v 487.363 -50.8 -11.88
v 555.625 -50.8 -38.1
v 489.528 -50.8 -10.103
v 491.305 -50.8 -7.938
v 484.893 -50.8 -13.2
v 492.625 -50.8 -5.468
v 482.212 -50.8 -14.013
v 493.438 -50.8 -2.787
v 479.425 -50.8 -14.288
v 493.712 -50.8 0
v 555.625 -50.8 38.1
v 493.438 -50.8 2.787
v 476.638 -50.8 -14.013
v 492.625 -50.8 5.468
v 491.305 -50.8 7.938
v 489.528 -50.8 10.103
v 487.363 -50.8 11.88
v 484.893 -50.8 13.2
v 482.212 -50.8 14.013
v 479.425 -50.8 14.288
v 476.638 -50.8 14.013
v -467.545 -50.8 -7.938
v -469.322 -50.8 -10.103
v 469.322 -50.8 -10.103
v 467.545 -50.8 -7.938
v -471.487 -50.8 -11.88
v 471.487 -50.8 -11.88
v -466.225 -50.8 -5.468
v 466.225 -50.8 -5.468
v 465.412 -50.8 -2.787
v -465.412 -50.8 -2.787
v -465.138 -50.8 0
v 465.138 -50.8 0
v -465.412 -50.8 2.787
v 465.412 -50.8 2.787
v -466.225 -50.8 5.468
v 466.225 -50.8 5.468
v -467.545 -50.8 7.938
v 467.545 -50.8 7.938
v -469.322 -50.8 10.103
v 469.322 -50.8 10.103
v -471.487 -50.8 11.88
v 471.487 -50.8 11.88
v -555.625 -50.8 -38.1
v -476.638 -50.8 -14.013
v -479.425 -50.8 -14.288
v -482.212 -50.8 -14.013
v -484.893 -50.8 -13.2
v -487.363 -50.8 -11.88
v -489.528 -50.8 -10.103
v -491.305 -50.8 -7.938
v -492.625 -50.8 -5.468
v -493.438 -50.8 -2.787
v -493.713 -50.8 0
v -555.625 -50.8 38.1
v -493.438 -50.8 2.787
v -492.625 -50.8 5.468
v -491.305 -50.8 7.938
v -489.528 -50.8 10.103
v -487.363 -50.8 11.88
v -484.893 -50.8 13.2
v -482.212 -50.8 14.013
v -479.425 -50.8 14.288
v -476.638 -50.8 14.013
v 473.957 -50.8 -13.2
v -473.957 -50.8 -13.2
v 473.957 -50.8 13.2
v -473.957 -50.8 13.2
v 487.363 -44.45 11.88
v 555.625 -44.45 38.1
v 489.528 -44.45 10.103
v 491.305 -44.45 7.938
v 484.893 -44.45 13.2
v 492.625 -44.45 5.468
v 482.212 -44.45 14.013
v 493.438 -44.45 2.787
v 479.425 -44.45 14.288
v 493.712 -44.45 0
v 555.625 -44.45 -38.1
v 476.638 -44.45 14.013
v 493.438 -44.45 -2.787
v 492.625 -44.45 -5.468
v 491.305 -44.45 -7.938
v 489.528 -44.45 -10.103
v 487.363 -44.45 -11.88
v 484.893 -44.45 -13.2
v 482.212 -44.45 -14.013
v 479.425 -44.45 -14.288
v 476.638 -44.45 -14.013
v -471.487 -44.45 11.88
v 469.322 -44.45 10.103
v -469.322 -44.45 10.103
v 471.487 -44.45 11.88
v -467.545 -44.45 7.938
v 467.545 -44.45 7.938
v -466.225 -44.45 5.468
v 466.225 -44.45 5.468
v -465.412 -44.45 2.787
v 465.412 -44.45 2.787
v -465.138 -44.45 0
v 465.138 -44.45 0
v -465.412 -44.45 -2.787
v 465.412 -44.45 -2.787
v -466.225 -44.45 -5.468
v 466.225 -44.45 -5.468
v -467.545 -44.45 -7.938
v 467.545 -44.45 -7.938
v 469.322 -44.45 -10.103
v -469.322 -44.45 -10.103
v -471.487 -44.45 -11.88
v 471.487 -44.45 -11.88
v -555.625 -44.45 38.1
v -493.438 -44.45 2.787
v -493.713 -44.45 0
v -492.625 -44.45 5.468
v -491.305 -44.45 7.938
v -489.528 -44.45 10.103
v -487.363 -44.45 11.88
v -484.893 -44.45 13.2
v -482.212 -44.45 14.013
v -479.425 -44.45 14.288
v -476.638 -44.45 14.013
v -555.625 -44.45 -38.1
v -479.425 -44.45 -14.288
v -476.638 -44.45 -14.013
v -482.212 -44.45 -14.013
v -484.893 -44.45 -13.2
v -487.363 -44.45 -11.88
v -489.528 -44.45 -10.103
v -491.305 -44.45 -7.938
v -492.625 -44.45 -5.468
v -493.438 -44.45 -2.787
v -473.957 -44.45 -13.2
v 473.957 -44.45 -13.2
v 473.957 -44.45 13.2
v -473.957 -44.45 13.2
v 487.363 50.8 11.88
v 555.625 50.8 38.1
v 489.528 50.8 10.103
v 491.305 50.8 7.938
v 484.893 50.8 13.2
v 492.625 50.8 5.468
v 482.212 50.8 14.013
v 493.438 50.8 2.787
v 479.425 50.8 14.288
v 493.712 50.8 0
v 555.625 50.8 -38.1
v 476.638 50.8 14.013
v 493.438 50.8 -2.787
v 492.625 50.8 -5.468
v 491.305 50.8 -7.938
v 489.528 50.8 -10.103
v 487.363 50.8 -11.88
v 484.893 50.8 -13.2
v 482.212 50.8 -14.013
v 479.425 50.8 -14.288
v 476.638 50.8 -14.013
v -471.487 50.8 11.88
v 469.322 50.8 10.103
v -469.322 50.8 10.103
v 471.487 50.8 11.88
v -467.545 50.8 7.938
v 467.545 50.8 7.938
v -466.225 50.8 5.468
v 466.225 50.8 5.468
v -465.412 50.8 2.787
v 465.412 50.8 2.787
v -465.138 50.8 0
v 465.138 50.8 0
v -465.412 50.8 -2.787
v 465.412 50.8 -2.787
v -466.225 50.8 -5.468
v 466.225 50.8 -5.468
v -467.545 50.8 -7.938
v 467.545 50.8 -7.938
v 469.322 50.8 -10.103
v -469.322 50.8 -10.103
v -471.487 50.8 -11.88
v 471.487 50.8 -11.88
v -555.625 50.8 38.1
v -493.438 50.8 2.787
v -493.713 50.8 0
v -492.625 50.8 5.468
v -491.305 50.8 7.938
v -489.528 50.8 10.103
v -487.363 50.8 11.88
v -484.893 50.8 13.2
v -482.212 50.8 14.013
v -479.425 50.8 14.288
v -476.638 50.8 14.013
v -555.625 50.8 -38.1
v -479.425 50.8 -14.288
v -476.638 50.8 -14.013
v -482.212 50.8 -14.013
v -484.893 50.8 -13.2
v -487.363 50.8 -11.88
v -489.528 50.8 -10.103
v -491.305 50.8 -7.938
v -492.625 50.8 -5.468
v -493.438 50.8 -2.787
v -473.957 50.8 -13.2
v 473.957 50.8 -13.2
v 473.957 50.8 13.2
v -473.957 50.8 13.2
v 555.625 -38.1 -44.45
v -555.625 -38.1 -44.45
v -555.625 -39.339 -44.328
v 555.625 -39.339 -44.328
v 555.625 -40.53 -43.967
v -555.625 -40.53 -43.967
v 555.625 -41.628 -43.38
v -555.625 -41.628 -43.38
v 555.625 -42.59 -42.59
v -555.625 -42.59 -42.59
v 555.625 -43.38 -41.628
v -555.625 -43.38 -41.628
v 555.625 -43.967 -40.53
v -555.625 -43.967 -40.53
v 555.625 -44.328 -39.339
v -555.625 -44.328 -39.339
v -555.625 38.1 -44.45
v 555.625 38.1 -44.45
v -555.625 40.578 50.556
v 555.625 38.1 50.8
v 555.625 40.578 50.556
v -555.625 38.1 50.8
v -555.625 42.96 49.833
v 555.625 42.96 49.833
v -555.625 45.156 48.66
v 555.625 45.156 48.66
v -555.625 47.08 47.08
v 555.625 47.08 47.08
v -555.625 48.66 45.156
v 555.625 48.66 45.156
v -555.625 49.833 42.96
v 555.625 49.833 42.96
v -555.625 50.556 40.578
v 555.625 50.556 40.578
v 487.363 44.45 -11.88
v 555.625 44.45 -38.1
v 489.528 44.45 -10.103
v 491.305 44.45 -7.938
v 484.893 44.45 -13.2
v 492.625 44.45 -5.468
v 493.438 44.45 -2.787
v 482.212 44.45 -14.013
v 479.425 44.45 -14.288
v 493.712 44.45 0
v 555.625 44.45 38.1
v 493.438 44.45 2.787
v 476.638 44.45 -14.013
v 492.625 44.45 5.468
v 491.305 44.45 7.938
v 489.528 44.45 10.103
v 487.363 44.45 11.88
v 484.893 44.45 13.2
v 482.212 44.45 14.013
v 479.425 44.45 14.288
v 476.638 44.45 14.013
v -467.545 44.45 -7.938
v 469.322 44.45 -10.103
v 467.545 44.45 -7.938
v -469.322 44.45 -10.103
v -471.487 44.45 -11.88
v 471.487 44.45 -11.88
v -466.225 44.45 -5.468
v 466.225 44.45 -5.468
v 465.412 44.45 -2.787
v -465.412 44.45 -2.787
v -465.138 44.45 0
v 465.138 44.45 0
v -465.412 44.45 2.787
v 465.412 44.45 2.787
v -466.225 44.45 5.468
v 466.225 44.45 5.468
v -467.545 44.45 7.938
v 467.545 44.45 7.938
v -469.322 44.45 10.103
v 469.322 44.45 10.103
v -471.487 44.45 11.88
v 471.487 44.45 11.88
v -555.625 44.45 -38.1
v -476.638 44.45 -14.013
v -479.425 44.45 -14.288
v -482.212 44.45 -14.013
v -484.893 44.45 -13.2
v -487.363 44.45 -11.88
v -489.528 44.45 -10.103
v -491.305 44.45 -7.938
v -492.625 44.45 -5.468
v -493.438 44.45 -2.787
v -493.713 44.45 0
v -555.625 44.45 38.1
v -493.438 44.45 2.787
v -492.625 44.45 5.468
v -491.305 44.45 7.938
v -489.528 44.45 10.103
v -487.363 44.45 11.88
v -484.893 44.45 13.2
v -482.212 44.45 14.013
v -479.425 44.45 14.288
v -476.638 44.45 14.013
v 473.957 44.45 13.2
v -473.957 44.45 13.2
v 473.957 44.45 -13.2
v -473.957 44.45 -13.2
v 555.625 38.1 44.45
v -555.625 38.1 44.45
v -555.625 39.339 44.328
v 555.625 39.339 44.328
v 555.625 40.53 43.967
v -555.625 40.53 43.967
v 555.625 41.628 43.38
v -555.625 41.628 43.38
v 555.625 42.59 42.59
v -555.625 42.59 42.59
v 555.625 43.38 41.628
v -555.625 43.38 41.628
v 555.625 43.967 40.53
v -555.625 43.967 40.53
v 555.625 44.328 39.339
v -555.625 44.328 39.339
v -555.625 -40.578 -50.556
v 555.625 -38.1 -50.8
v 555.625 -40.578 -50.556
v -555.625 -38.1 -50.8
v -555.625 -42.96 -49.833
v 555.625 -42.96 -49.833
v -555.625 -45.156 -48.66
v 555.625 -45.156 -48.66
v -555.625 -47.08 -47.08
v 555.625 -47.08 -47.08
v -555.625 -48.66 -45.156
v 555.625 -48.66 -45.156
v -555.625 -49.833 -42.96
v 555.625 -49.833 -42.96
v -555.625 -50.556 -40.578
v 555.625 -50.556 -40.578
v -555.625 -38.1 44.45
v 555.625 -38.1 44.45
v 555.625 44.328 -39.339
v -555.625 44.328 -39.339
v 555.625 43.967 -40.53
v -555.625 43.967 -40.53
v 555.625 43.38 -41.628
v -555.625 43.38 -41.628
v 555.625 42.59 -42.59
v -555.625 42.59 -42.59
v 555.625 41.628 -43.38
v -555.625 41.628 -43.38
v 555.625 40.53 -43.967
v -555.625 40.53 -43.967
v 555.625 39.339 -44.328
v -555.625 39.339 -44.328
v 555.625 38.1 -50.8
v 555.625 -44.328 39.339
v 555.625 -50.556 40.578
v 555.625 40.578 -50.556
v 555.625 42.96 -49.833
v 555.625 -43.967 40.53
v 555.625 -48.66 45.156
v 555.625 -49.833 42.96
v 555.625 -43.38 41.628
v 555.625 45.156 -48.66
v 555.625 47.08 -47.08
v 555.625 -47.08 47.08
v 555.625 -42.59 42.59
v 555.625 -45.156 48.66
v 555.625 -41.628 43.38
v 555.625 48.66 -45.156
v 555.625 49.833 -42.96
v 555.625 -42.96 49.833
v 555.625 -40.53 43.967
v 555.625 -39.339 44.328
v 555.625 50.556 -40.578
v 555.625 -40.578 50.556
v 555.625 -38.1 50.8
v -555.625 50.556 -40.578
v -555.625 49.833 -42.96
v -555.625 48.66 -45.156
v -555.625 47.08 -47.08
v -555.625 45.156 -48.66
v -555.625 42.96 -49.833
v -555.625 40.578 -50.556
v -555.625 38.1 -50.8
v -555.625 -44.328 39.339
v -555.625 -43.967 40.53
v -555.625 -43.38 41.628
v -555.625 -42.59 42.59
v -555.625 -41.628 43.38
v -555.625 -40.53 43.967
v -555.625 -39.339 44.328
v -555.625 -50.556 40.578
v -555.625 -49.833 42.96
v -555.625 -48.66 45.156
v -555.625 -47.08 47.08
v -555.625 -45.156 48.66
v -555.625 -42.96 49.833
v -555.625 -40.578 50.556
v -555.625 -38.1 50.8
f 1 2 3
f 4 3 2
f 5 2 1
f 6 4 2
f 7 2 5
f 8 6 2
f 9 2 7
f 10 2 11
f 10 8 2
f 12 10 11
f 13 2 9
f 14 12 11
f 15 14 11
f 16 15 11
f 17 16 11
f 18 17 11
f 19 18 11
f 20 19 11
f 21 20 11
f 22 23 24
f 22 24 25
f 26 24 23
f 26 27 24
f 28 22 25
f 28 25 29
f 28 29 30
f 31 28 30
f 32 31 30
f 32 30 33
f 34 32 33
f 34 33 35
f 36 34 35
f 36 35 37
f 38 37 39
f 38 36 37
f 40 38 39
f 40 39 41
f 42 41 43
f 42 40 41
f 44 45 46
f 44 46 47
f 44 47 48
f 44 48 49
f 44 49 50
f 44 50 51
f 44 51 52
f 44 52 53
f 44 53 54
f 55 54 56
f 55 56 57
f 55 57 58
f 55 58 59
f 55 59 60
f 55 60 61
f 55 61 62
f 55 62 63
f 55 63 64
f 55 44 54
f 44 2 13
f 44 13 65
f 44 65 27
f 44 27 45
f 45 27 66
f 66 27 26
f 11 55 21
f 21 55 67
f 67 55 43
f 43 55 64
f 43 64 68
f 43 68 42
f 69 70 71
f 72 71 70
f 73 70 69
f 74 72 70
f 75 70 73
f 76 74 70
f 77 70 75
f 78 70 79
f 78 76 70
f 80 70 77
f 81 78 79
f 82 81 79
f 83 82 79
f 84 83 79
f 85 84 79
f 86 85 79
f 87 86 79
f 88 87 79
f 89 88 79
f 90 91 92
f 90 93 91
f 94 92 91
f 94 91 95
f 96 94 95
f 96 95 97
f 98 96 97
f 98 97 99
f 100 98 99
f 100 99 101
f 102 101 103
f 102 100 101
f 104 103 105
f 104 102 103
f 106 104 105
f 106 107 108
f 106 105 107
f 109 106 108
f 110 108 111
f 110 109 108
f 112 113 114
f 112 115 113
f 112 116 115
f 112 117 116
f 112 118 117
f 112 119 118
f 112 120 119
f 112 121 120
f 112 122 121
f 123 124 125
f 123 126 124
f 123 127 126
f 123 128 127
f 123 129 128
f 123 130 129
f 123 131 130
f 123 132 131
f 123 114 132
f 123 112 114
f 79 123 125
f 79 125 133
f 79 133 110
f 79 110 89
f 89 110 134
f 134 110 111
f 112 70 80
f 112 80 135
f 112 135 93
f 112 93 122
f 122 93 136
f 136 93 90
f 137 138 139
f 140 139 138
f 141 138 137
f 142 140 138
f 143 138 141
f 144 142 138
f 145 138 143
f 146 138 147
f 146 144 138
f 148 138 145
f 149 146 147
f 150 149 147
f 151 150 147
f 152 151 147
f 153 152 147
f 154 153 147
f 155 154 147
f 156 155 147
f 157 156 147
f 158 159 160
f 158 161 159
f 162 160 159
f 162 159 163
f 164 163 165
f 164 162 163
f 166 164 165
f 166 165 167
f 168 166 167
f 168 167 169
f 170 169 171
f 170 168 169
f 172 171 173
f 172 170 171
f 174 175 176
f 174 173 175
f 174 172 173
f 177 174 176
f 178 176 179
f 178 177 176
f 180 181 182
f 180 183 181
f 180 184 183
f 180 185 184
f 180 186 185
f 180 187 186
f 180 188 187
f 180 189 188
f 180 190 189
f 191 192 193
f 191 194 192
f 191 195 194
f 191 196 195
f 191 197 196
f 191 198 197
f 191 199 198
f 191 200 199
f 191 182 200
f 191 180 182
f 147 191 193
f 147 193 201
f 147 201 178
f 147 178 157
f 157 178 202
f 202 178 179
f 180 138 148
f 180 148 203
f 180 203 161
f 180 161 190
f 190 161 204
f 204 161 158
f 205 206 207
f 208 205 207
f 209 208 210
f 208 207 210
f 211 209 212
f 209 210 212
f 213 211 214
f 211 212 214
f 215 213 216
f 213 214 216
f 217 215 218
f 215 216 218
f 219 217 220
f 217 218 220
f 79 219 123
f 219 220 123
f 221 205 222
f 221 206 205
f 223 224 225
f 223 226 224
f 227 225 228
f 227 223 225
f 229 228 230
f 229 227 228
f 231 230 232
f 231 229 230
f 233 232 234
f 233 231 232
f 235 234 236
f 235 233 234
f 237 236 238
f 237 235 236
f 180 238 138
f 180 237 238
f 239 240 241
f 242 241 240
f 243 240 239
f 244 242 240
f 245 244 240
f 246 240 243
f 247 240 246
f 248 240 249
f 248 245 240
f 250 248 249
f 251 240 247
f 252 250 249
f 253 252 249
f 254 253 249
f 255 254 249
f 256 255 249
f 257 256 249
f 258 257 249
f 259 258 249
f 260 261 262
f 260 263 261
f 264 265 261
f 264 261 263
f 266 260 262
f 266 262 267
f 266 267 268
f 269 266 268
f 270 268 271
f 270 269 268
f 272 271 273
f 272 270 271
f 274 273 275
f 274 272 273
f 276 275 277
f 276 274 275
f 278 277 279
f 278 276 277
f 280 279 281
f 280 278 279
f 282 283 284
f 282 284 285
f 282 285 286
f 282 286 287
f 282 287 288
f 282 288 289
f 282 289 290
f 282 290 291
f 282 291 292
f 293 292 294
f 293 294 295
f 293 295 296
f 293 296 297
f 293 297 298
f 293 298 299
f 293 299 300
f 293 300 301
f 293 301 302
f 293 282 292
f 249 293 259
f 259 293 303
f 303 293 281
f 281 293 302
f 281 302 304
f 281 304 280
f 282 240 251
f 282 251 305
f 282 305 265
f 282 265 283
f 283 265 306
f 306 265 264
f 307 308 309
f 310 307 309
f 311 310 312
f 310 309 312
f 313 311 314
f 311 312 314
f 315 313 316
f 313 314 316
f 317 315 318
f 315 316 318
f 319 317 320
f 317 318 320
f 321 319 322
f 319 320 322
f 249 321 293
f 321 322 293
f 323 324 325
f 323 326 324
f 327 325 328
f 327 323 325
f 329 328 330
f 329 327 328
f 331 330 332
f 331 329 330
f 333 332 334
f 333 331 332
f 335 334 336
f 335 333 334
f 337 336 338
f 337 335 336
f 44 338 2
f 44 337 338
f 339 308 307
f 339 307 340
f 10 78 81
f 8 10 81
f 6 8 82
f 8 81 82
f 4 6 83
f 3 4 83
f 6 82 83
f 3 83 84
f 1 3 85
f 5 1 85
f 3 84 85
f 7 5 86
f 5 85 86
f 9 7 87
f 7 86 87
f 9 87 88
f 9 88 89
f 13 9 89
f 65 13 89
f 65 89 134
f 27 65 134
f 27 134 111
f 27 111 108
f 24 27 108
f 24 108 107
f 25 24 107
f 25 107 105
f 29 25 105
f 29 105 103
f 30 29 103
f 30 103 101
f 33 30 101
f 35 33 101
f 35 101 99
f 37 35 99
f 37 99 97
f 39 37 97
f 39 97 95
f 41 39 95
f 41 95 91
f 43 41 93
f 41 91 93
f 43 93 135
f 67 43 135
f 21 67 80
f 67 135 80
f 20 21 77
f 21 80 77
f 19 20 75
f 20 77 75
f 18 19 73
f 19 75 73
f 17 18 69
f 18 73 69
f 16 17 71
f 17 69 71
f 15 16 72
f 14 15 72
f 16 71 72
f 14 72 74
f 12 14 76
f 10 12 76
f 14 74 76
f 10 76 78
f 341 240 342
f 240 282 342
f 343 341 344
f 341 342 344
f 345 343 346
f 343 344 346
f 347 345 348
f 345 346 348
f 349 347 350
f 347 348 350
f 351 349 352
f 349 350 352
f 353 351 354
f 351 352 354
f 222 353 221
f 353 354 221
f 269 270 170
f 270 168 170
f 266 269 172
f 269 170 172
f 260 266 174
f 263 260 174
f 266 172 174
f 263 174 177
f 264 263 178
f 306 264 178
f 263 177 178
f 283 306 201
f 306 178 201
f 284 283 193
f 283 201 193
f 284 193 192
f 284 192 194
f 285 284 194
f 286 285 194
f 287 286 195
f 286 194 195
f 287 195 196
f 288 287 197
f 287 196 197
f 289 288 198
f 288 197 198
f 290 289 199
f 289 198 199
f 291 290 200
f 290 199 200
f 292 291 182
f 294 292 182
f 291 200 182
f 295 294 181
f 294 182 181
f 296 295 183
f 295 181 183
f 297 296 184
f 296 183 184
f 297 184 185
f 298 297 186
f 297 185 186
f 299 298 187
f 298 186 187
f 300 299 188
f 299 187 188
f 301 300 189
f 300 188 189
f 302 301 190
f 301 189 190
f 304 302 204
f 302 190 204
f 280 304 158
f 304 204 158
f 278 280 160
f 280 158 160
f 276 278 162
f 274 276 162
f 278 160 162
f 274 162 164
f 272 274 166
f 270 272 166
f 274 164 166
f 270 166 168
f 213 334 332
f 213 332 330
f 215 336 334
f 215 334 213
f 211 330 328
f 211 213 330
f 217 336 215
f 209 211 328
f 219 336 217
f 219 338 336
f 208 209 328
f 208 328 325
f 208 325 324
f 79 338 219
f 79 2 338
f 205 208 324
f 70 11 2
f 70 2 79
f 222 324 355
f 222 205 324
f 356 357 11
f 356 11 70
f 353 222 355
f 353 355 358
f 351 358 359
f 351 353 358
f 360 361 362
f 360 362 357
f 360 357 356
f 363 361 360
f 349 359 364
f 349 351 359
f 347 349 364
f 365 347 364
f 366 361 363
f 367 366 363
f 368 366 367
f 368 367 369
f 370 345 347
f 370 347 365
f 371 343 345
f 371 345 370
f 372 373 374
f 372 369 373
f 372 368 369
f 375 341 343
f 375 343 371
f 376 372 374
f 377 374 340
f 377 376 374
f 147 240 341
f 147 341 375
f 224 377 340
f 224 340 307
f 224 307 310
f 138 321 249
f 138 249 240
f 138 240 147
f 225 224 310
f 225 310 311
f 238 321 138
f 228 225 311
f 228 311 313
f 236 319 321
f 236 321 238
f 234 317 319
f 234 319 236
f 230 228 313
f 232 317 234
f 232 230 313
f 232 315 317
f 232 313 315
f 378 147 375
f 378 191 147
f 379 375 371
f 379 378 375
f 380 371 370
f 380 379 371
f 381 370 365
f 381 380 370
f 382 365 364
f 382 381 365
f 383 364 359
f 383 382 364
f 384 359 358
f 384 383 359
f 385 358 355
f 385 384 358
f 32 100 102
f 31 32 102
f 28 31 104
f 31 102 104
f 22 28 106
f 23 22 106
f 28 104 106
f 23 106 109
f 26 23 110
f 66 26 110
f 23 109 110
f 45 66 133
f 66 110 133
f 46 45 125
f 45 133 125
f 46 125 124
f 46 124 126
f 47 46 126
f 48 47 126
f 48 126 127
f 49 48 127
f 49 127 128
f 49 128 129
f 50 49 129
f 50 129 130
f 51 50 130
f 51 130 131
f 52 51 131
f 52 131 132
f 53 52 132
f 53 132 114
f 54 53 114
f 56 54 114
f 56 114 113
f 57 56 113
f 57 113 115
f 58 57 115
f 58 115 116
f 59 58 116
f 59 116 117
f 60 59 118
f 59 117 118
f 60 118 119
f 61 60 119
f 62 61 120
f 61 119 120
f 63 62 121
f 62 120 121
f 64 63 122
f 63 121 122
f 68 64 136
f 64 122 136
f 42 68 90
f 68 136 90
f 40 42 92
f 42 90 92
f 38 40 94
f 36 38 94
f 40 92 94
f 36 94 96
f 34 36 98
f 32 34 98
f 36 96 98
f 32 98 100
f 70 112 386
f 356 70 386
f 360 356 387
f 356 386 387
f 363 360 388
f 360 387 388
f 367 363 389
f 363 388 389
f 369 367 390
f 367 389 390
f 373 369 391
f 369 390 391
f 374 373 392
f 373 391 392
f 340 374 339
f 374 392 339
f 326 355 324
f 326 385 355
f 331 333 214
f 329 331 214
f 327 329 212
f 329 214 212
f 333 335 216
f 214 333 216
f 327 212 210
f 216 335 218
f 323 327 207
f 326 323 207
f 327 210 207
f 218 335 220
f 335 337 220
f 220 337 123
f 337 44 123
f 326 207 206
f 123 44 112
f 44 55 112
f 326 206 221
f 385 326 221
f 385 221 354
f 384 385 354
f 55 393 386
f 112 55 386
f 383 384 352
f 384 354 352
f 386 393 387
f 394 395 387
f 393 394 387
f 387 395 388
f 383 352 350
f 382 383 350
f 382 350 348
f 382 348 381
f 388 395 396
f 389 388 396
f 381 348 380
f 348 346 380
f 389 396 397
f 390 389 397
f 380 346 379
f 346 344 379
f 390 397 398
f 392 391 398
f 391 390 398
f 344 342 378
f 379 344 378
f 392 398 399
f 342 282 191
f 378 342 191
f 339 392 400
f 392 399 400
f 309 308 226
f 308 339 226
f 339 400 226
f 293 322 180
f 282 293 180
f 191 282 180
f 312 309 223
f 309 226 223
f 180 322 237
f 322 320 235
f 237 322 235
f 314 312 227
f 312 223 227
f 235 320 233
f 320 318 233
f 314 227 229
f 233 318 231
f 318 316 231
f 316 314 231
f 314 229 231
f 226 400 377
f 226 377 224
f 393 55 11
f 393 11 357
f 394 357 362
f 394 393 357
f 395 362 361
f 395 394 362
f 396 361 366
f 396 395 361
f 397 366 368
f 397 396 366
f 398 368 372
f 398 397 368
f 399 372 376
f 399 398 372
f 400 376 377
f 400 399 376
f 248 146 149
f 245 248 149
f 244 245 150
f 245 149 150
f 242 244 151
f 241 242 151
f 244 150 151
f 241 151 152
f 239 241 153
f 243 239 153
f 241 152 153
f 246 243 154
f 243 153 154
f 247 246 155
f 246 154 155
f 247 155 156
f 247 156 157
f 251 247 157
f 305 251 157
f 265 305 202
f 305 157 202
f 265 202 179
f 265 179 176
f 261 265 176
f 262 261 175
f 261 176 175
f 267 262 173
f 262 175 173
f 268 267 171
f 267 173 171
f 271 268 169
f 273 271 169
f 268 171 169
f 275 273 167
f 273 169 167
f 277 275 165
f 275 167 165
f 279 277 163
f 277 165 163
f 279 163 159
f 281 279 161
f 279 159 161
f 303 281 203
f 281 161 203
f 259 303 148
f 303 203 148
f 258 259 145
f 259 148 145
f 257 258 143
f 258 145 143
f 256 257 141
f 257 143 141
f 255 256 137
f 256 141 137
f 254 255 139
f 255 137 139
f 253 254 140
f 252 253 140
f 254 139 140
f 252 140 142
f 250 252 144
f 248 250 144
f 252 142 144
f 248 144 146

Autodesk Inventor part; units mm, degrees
ref_plane "YZ Plane" through (0, 0, 0) normal (1, 0, 0) x (0, 1, 0)
ref_plane "XZ Plane" through (0, 0, 0) normal (0, 1, 0) x (-1, 0, 0)
ref_plane "XY Plane" through (0, 0, 0) normal (0, 0, 1) x (1, 0, 0)
sketch "Sketch5" plane through (0, 0, 0) normal (1, 0, 0) x (0, 1, 0)
  line L0 (-38.1, 50.8) -> (38.1, 50.8)
  line L1 (50.8, 38.1) -> (50.8, -38.1)
  line L2 (38.1, -50.8) -> (-38.1, -50.8)
  line L3 (-50.8, -38.1) -> (-50.8, 38.1)
  line L4 (-50.8, 50.8) -> (50.8, -50.8) construction
  line L5 (50.8, 50.8) -> (-50.8, -50.8) construction
  arc A0 (50.8, 38.1) -> (38.1, 50.8) centre (38.1, 38.1) ccw
  arc A1 (38.1, -50.8) -> (50.8, -38.1) centre (38.1, -38.1) ccw
  arc A2 (-50.8, -38.1) -> (-38.1, -50.8) centre (-38.1, -38.1) ccw
  arc A3 (-38.1, 50.8) -> (-50.8, 38.1) centre (-38.1, 38.1) ccw
  line L6 (44.45, -38.1) -> (44.45, 38.1)
  arc A4 (44.45, 38.1) -> (38.1, 44.45) centre (38.1, 38.1) ccw
  line L7 (38.1, 44.45) -> (-38.1, 44.45)
  arc A5 (-38.1, 44.45) -> (-44.45, 38.1) centre (-38.1, 38.1) ccw
  line L8 (-44.45, 38.1) -> (-44.45, -38.1)
  arc A6 (-44.45, -38.1) -> (-38.1, -44.45) centre (-38.1, -38.1) ccw
  line L9 (-38.1, -44.45) -> (38.1, -44.45)
  arc A7 (38.1, -44.45) -> (44.45, -38.1) centre (38.1, -38.1) ccw
  point P0 (0, 0)
  dimension "d6" = 101.6
  dimension "d7" = 101.6
  dimension "d8" = 12.7
  dimension "d9" = 6.35
extrude "Extrusion4" add sketch "Sketch5" along normal mid plane 1111.25
sketch "Sketch9" plane through (-555.625, 50.8, 38.1) normal (0, 1, 0) x (1, 0, 0)
  line L0 (0, 38.1) -> (1111.25, 38.1) construction
  line L1 (1111.25, 0) -> (1111.25, 76.2) projected
  circle A0 centre (76.2, 38.1) radius 14.2875
  line L2 (0, 0) -> (0, 76.2) projected
  circle A1 centre (1035.05, 38.1) radius 14.2875
  point P0 (555.625, 38.1)
  dimension "d30" = 28.575
  dimension "d31" = 76.2
  dimension "d32" = 76.2
extrude "Extrusion8" cut sketch "Sketch9" against normal blind 382.5875
properties part number "Model-4_Base Tube-1" material "SS304"
